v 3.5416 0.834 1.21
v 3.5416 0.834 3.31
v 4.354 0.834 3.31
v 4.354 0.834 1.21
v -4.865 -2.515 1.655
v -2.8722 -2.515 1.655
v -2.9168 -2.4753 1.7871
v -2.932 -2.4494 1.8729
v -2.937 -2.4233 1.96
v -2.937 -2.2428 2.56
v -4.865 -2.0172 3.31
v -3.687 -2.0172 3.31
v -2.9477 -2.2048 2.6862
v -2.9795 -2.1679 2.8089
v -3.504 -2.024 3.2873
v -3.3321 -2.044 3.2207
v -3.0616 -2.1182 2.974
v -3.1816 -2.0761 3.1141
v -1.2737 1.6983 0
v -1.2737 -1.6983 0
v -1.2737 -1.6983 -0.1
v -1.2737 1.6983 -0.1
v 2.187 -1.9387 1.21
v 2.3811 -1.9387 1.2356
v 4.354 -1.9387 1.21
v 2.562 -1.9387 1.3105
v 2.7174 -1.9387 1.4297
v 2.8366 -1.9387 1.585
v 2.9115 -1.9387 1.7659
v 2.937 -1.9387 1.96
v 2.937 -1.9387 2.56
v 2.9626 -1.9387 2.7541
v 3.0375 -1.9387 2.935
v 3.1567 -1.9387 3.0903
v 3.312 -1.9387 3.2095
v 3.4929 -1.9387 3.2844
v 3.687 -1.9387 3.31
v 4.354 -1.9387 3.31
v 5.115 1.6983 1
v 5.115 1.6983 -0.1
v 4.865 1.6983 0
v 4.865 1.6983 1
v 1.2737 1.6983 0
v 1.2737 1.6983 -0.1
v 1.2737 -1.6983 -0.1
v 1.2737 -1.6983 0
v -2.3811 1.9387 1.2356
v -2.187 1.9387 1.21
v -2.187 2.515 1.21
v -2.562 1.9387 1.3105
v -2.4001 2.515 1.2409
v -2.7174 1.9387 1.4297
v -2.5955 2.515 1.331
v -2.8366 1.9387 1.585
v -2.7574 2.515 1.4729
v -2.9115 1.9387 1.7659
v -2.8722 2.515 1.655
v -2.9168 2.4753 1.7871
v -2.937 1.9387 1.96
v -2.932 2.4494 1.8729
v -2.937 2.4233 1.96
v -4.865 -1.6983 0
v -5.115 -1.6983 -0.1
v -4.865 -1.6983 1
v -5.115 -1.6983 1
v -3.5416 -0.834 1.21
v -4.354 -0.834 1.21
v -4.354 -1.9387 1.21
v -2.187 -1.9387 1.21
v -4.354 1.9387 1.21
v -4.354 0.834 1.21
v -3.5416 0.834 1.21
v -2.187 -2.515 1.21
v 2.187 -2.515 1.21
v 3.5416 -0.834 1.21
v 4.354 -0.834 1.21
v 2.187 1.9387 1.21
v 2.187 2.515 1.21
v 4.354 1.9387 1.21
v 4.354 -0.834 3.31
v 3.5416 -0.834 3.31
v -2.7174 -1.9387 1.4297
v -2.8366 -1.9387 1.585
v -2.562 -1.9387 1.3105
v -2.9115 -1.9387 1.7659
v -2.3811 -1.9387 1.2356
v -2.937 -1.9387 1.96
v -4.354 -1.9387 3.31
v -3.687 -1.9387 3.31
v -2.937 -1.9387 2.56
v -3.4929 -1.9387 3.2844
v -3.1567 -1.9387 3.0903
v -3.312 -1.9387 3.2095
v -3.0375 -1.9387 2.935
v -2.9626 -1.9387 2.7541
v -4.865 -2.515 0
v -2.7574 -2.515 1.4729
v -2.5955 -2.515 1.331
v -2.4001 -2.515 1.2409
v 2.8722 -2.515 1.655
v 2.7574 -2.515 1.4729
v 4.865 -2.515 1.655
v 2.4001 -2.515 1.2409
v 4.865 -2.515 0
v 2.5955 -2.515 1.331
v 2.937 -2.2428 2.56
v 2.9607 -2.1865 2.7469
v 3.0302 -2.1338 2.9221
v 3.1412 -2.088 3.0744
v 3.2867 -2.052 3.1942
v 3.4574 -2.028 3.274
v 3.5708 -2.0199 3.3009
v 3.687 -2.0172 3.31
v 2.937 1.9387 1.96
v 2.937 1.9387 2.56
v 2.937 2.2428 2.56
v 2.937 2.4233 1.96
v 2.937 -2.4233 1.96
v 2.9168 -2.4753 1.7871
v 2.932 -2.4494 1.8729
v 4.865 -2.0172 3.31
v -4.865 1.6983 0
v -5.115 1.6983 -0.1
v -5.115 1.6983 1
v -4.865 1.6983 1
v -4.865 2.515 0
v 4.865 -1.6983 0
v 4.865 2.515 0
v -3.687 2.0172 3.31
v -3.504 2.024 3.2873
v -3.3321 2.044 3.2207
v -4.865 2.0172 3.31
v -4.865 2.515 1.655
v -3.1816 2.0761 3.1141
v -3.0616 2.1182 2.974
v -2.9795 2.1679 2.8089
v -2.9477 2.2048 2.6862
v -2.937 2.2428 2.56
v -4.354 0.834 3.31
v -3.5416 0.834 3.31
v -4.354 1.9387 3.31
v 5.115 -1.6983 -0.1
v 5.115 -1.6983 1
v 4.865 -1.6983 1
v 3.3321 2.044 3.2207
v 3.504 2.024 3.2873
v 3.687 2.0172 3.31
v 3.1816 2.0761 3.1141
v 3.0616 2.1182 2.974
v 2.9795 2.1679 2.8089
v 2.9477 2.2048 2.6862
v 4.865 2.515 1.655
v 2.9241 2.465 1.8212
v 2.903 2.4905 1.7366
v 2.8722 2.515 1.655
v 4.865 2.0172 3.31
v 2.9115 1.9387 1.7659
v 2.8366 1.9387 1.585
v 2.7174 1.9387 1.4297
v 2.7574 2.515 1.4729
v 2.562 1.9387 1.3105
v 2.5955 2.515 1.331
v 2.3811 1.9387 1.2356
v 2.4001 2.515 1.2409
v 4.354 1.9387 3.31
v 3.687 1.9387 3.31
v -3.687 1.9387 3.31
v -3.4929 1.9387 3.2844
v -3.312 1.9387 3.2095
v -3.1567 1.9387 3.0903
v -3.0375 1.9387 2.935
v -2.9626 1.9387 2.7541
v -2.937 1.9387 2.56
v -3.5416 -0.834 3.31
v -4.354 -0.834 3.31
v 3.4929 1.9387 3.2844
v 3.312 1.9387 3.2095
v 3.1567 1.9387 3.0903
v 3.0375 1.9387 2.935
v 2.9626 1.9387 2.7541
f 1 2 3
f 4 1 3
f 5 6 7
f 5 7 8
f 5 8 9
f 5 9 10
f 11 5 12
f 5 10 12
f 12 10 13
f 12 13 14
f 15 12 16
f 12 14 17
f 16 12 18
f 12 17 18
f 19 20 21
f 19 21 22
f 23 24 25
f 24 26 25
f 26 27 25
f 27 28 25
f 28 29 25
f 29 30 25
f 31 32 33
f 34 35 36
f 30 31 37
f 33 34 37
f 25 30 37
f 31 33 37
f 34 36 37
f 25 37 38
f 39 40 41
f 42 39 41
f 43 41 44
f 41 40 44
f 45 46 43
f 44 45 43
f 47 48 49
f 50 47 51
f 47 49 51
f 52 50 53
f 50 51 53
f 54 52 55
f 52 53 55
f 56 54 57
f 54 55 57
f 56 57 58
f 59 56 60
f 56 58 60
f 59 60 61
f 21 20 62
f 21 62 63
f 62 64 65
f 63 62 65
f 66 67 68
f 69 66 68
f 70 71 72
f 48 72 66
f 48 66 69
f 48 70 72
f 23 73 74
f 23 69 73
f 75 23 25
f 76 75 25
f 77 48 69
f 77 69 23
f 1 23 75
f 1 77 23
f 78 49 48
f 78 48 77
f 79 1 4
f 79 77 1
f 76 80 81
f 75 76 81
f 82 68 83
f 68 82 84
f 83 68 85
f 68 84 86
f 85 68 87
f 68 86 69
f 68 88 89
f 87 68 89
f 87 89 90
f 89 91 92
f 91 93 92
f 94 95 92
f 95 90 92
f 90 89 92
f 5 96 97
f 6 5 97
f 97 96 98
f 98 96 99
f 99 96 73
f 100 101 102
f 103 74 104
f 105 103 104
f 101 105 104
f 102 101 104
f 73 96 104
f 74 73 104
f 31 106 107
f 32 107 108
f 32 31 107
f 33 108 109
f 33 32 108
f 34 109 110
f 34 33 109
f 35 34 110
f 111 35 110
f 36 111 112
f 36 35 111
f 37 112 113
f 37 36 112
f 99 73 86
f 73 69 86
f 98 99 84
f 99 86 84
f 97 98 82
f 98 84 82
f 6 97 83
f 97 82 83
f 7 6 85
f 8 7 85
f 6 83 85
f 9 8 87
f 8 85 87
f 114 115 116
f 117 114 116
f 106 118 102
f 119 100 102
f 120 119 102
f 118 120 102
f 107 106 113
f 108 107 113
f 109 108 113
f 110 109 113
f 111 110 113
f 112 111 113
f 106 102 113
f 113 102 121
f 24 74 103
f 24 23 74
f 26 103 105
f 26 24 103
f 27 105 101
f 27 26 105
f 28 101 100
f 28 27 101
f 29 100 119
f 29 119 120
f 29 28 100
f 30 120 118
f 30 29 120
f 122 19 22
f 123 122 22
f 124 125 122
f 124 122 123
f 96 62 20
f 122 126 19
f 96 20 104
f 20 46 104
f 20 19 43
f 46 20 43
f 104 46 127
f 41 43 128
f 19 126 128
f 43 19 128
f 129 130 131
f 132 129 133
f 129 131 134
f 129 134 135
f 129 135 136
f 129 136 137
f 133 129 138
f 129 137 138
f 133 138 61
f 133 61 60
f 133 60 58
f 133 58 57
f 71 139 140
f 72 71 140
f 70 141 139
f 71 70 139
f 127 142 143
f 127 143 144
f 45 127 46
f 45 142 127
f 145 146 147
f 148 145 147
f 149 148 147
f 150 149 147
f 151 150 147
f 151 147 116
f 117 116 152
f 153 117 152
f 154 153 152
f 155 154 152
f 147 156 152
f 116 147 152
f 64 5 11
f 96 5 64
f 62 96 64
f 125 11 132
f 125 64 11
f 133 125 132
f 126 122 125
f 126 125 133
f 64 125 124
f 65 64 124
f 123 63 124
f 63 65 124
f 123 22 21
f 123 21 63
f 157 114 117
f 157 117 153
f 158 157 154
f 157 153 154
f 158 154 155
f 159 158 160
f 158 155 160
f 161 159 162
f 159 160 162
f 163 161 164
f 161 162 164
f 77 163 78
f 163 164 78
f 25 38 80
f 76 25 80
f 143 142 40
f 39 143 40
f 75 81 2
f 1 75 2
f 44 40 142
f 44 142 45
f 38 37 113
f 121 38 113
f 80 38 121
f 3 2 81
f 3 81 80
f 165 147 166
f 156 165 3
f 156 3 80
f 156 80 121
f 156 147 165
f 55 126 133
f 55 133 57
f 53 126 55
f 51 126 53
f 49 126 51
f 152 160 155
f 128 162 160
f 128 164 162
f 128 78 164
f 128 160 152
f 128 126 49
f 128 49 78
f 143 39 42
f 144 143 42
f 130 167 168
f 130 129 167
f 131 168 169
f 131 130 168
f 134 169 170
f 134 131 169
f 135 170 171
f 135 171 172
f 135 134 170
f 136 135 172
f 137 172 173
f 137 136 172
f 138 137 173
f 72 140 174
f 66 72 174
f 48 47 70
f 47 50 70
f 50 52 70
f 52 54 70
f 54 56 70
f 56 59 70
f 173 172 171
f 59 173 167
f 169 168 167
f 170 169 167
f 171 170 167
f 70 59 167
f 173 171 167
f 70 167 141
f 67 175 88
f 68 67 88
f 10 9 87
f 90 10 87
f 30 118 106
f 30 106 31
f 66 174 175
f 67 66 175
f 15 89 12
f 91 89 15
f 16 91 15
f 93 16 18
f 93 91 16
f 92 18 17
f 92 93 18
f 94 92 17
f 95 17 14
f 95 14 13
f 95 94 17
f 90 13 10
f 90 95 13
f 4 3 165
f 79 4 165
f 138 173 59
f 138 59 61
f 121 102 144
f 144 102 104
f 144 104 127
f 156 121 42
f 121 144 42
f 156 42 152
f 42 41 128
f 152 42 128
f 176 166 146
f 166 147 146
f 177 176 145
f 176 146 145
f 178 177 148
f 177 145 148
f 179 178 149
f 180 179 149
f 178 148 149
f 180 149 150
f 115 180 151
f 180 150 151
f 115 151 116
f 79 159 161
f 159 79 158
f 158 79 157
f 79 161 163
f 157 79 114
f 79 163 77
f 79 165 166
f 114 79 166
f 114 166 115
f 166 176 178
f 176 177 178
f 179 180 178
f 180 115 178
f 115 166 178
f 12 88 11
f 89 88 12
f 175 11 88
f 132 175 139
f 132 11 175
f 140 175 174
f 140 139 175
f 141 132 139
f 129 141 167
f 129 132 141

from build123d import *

# Parameters (mm, degrees)
ESQUISSE1_W             = 9.73
ESQUISSE1_H             = 5.03
BOSS_EXTRU_1_DEPTH      = 3.31
ESQUISSE3_W             = 3.841312789
ESQUISSE3_H             = 3.396529204
BOSS_EXTRU_2_DEPTH      = 0.1
BOSS_EXTRU_2_DEPTH_BACK = 1
ENL_V_MAT_EXTRU_1_DEPTH = 10.98001124
ESQUISSE5_W             = 5.874071128
ESQUISSE5_H             = 5.928896842
ENL_V_MAT_EXTRU_2_DEPTH = 2.1
ENL_V_MAT_EXTRU_4_DEPTH = 2.1
CONG_1_R                = 0.75
CONG_2_R                = 0.75


with BuildPart() as part:
    # Esquisse1 → Boss.-Extru.1 (new body)
    with BuildSketch(Plane.XY):
        Rectangle(ESQUISSE1_W, ESQUISSE1_H)
    extrude(amount=BOSS_EXTRU_1_DEPTH)

    # Esquisse3 → Boss.-Extru.2 (add, two sides)
    with BuildSketch(Plane(origin=(0, 0, 0), x_dir=(-1, 0, 0), z_dir=(0, 0, -1))) as boss_extru_2_sk:
        with Locations((-3.194354846, 0)):
            Rectangle(ESQUISSE3_W, ESQUISSE3_H)
        with Locations((3.194354846, 0)):
            Rectangle(ESQUISSE3_W, ESQUISSE3_H)
    extrude(amount=BOSS_EXTRU_2_DEPTH)
    extrude(boss_extru_2_sk.sketch, amount=-BOSS_EXTRU_2_DEPTH_BACK)

    # Esquisse4 → Enlèv. mat.-Extru.1 (cut, through all)
    with BuildSketch(Plane(origin=(4.865, 0, 0), x_dir=(0, 0, -1), z_dir=(1, 0, 0))):
        Polygon((-1.655, -2.515), (-3.31, -2.017151535), (-3.31, 2.017151535), (-1.655, 2.515), (-1.655, 2.602439027), (-3.426184741, 2.639019495), (-3.454926537, -2.688664416), (-1.655, -2.688664416), align=None)
    extrude(amount=-ENL_V_MAT_EXTRU_1_DEPTH, mode=Mode.SUBTRACT)

    # Esquisse5 → Enlèv. mat.-Extru.2 (cut)
    with BuildSketch(Plane.XY.offset(3.31)):
        with Locations((0, 0.049057066)):
            Rectangle(ESQUISSE5_W, ESQUISSE5_H)
    extrude(amount=-ENL_V_MAT_EXTRU_2_DEPTH, mode=Mode.SUBTRACT)

    # Esquisse6 → Enlèv. mat.-Extru.4 (cut)
    with BuildSketch(Plane.XY.offset(3.31)):
        Polygon((-2.937035564, 1.938709767), (-2.937035564, -1.938709767), (4.353991242, -1.938709767), (4.353991242, -0.833970123), (3.541647976, -0.833970123), (3.541647976, 0.833970123), (4.353991242, 0.833970123), (4.353991242, 1.938709767), align=None)
        Polygon((-4.353991242, -0.833970123), (-4.353991242, -1.938709767), (-2.937035564, -1.938709767), (-2.937035564, 1.938709767), (-4.353991242, 1.938709767), (-4.353991242, 0.833970123), (-3.541647976, 0.833970123), (-3.541647976, -0.833970123), align=None)
    extrude(amount=-ENL_V_MAT_EXTRU_4_DEPTH, mode=Mode.SUBTRACT)

    # Congé1
    cong_1_edges = [part.edges().sort_by_distance(p)[0] for p in [
        (-2.937035564, 2.226854883, 1.21),
        (2.937035564, 2.226854883, 1.21),
        (2.937035564, -2.226854883, 1.21),
        (-2.937035564, -2.226854883, 1.21),
    ]]
    fillet(cong_1_edges, radius=CONG_1_R)

    # Congé2
    cong_2_edges = [part.edges().sort_by_distance(p)[0] for p in [
        (2.937035564, 1.977930651, 3.31),
        (-2.937035564, -1.977930651, 3.31),
        (-2.937035564, 1.977930651, 3.31),
        (2.937035564, -1.977930651, 3.31),
    ]]
    fillet(cong_2_edges, radius=CONG_2_R)


solid = part.part
